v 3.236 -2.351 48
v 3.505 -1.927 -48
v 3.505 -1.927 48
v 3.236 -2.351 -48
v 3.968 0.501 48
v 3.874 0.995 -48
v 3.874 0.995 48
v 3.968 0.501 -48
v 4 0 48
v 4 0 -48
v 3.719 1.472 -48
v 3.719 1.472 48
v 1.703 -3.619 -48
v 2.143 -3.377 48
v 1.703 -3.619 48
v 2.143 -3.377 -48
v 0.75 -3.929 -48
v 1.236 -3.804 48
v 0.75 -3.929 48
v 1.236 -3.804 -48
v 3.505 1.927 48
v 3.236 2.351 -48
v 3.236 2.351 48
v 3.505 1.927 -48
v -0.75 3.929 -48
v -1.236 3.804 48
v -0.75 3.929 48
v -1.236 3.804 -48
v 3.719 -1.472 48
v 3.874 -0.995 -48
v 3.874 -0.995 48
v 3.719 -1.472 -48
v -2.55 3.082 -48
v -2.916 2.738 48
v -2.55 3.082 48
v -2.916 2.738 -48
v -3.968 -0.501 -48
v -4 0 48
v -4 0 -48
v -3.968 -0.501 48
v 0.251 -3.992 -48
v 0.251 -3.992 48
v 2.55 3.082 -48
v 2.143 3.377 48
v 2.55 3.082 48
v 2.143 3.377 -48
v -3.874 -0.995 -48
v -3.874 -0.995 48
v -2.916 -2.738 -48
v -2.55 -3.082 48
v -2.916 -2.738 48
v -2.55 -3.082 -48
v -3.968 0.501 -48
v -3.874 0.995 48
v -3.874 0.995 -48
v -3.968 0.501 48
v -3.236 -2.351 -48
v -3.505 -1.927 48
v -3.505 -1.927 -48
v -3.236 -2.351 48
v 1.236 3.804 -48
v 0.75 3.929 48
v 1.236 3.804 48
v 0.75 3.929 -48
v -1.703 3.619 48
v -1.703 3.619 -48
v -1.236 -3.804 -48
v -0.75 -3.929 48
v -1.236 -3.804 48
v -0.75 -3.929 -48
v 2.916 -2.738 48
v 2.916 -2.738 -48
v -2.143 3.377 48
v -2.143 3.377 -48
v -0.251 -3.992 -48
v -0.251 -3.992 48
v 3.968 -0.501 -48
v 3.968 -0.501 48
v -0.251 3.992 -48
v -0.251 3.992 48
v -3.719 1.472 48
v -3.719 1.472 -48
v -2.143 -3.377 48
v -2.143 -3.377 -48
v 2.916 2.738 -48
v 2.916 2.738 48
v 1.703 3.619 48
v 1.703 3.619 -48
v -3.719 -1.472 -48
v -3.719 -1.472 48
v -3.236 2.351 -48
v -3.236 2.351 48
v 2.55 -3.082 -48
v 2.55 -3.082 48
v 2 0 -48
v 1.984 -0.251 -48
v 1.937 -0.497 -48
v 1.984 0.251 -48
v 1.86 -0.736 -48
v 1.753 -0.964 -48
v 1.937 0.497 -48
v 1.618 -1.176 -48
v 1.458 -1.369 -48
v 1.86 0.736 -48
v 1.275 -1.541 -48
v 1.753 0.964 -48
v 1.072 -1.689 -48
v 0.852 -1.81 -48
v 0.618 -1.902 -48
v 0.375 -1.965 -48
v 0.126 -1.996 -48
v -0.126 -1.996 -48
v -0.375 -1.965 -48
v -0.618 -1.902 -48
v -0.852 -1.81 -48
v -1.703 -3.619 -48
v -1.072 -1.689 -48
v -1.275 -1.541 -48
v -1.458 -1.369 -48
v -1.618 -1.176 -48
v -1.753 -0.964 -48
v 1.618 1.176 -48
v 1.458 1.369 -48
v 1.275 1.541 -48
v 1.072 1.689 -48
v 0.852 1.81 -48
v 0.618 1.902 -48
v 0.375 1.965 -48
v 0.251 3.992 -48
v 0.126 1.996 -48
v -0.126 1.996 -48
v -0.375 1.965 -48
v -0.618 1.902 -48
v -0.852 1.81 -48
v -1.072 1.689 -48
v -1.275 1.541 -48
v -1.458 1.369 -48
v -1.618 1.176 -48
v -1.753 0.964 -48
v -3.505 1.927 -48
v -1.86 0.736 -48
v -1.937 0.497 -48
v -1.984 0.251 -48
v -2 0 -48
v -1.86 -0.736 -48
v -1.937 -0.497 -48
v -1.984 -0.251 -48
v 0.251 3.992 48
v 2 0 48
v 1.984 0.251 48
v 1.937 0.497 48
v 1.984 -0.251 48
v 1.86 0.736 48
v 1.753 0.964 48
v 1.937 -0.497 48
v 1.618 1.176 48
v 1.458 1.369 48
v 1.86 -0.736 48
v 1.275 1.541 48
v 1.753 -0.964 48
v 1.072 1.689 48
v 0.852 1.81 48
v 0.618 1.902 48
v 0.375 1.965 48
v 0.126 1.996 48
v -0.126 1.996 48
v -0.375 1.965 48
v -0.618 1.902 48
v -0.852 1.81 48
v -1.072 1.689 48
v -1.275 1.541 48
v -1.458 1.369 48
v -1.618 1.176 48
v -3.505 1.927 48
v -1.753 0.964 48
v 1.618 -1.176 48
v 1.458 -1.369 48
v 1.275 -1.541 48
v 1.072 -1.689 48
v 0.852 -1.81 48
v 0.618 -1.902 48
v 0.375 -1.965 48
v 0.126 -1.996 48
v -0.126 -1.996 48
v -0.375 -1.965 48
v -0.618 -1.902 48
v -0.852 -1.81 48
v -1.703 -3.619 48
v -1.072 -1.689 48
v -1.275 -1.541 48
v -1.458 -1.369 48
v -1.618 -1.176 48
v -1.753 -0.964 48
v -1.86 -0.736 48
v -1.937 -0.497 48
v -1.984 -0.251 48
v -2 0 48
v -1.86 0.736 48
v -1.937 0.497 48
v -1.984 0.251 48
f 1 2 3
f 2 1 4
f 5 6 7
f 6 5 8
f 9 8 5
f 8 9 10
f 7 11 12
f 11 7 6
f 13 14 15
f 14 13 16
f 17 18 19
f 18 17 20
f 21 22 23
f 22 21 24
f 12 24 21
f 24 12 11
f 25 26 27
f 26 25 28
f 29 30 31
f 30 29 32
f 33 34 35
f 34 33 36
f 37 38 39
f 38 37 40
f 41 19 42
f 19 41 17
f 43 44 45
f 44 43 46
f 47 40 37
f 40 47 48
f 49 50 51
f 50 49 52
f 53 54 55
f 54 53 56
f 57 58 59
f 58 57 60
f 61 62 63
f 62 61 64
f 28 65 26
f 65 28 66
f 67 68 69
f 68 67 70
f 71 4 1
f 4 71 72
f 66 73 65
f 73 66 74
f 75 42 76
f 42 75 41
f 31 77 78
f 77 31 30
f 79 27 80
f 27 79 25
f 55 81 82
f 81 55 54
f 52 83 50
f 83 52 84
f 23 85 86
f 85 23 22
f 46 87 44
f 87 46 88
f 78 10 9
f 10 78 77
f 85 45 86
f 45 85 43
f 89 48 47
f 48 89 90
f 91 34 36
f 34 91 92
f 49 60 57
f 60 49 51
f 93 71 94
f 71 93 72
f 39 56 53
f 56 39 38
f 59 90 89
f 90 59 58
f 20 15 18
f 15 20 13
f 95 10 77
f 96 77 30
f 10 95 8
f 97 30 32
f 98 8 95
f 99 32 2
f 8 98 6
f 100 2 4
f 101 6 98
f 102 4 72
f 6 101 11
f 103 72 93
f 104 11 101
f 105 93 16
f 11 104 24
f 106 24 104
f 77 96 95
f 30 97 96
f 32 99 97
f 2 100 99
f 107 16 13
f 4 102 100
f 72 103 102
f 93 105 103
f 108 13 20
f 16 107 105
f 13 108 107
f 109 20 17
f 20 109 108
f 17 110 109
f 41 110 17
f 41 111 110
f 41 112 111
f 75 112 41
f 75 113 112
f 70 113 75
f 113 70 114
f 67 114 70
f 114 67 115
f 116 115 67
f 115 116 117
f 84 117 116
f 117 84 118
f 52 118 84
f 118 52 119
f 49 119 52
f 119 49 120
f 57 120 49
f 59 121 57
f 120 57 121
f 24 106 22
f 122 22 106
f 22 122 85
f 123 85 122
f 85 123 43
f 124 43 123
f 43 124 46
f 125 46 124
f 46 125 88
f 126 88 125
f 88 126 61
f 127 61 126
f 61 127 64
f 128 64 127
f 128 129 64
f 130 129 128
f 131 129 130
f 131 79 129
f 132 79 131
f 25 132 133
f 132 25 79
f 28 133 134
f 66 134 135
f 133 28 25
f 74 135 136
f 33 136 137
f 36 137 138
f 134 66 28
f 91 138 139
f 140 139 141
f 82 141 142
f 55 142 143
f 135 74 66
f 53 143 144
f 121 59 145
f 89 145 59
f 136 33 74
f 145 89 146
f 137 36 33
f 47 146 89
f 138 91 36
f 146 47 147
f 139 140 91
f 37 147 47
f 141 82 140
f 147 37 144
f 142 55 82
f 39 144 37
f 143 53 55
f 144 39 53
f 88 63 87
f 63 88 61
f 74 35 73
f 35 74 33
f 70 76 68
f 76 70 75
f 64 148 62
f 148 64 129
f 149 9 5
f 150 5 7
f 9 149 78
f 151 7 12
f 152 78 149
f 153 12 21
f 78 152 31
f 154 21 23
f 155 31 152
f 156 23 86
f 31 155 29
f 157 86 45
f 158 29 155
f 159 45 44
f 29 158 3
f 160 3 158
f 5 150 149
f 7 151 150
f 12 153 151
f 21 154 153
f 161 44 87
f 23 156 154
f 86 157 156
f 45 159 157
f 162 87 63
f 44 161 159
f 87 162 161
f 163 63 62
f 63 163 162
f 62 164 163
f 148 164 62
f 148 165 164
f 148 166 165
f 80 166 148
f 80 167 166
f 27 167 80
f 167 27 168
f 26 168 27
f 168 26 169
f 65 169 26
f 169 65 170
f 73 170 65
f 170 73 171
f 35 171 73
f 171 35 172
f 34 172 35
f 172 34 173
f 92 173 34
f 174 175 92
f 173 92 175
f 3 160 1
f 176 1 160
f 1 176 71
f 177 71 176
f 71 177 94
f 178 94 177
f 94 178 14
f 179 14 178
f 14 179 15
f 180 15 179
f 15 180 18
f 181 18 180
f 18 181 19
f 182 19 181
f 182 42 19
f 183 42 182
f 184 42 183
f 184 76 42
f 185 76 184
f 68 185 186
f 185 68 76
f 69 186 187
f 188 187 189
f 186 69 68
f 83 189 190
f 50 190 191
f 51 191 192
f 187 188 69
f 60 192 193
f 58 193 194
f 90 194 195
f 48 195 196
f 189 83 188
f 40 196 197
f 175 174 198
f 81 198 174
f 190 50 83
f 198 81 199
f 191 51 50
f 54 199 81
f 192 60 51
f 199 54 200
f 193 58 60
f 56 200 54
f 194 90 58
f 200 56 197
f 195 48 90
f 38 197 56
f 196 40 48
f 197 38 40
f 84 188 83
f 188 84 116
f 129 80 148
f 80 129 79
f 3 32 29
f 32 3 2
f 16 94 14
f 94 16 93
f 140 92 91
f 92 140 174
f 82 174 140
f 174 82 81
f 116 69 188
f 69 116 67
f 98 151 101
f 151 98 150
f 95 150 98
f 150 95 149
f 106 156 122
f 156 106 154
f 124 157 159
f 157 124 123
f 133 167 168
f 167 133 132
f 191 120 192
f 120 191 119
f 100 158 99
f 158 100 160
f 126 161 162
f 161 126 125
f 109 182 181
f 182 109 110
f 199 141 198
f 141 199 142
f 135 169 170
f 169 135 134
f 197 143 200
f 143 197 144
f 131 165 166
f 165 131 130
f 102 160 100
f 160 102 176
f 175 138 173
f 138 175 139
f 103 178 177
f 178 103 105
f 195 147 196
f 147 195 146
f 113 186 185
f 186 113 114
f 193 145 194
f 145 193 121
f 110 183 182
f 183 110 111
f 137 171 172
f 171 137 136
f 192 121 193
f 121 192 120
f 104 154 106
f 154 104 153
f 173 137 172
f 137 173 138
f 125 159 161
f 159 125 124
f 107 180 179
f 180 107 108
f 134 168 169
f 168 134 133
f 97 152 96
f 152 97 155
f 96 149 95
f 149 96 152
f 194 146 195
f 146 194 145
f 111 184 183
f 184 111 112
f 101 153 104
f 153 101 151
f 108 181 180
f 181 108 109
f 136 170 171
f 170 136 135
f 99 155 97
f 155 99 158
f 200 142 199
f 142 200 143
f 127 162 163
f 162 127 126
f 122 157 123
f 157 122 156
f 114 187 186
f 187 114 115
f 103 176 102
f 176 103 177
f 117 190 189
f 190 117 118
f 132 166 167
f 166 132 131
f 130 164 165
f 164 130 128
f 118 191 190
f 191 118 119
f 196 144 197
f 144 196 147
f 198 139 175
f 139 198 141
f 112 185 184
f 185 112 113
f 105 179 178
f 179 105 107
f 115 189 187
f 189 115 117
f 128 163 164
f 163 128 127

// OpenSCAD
$fn = 50;


difference() {
	union() {
		translate(v = [0, 0, -48.0000000000]) {
			cylinder(h = 96, r = 4.0000000000);
		}
	}
	union() {
		translate(v = [0, 0, -100.0000000000]) {
			cylinder(h = 200, r = 2.0000000000);
		}
	}
}
